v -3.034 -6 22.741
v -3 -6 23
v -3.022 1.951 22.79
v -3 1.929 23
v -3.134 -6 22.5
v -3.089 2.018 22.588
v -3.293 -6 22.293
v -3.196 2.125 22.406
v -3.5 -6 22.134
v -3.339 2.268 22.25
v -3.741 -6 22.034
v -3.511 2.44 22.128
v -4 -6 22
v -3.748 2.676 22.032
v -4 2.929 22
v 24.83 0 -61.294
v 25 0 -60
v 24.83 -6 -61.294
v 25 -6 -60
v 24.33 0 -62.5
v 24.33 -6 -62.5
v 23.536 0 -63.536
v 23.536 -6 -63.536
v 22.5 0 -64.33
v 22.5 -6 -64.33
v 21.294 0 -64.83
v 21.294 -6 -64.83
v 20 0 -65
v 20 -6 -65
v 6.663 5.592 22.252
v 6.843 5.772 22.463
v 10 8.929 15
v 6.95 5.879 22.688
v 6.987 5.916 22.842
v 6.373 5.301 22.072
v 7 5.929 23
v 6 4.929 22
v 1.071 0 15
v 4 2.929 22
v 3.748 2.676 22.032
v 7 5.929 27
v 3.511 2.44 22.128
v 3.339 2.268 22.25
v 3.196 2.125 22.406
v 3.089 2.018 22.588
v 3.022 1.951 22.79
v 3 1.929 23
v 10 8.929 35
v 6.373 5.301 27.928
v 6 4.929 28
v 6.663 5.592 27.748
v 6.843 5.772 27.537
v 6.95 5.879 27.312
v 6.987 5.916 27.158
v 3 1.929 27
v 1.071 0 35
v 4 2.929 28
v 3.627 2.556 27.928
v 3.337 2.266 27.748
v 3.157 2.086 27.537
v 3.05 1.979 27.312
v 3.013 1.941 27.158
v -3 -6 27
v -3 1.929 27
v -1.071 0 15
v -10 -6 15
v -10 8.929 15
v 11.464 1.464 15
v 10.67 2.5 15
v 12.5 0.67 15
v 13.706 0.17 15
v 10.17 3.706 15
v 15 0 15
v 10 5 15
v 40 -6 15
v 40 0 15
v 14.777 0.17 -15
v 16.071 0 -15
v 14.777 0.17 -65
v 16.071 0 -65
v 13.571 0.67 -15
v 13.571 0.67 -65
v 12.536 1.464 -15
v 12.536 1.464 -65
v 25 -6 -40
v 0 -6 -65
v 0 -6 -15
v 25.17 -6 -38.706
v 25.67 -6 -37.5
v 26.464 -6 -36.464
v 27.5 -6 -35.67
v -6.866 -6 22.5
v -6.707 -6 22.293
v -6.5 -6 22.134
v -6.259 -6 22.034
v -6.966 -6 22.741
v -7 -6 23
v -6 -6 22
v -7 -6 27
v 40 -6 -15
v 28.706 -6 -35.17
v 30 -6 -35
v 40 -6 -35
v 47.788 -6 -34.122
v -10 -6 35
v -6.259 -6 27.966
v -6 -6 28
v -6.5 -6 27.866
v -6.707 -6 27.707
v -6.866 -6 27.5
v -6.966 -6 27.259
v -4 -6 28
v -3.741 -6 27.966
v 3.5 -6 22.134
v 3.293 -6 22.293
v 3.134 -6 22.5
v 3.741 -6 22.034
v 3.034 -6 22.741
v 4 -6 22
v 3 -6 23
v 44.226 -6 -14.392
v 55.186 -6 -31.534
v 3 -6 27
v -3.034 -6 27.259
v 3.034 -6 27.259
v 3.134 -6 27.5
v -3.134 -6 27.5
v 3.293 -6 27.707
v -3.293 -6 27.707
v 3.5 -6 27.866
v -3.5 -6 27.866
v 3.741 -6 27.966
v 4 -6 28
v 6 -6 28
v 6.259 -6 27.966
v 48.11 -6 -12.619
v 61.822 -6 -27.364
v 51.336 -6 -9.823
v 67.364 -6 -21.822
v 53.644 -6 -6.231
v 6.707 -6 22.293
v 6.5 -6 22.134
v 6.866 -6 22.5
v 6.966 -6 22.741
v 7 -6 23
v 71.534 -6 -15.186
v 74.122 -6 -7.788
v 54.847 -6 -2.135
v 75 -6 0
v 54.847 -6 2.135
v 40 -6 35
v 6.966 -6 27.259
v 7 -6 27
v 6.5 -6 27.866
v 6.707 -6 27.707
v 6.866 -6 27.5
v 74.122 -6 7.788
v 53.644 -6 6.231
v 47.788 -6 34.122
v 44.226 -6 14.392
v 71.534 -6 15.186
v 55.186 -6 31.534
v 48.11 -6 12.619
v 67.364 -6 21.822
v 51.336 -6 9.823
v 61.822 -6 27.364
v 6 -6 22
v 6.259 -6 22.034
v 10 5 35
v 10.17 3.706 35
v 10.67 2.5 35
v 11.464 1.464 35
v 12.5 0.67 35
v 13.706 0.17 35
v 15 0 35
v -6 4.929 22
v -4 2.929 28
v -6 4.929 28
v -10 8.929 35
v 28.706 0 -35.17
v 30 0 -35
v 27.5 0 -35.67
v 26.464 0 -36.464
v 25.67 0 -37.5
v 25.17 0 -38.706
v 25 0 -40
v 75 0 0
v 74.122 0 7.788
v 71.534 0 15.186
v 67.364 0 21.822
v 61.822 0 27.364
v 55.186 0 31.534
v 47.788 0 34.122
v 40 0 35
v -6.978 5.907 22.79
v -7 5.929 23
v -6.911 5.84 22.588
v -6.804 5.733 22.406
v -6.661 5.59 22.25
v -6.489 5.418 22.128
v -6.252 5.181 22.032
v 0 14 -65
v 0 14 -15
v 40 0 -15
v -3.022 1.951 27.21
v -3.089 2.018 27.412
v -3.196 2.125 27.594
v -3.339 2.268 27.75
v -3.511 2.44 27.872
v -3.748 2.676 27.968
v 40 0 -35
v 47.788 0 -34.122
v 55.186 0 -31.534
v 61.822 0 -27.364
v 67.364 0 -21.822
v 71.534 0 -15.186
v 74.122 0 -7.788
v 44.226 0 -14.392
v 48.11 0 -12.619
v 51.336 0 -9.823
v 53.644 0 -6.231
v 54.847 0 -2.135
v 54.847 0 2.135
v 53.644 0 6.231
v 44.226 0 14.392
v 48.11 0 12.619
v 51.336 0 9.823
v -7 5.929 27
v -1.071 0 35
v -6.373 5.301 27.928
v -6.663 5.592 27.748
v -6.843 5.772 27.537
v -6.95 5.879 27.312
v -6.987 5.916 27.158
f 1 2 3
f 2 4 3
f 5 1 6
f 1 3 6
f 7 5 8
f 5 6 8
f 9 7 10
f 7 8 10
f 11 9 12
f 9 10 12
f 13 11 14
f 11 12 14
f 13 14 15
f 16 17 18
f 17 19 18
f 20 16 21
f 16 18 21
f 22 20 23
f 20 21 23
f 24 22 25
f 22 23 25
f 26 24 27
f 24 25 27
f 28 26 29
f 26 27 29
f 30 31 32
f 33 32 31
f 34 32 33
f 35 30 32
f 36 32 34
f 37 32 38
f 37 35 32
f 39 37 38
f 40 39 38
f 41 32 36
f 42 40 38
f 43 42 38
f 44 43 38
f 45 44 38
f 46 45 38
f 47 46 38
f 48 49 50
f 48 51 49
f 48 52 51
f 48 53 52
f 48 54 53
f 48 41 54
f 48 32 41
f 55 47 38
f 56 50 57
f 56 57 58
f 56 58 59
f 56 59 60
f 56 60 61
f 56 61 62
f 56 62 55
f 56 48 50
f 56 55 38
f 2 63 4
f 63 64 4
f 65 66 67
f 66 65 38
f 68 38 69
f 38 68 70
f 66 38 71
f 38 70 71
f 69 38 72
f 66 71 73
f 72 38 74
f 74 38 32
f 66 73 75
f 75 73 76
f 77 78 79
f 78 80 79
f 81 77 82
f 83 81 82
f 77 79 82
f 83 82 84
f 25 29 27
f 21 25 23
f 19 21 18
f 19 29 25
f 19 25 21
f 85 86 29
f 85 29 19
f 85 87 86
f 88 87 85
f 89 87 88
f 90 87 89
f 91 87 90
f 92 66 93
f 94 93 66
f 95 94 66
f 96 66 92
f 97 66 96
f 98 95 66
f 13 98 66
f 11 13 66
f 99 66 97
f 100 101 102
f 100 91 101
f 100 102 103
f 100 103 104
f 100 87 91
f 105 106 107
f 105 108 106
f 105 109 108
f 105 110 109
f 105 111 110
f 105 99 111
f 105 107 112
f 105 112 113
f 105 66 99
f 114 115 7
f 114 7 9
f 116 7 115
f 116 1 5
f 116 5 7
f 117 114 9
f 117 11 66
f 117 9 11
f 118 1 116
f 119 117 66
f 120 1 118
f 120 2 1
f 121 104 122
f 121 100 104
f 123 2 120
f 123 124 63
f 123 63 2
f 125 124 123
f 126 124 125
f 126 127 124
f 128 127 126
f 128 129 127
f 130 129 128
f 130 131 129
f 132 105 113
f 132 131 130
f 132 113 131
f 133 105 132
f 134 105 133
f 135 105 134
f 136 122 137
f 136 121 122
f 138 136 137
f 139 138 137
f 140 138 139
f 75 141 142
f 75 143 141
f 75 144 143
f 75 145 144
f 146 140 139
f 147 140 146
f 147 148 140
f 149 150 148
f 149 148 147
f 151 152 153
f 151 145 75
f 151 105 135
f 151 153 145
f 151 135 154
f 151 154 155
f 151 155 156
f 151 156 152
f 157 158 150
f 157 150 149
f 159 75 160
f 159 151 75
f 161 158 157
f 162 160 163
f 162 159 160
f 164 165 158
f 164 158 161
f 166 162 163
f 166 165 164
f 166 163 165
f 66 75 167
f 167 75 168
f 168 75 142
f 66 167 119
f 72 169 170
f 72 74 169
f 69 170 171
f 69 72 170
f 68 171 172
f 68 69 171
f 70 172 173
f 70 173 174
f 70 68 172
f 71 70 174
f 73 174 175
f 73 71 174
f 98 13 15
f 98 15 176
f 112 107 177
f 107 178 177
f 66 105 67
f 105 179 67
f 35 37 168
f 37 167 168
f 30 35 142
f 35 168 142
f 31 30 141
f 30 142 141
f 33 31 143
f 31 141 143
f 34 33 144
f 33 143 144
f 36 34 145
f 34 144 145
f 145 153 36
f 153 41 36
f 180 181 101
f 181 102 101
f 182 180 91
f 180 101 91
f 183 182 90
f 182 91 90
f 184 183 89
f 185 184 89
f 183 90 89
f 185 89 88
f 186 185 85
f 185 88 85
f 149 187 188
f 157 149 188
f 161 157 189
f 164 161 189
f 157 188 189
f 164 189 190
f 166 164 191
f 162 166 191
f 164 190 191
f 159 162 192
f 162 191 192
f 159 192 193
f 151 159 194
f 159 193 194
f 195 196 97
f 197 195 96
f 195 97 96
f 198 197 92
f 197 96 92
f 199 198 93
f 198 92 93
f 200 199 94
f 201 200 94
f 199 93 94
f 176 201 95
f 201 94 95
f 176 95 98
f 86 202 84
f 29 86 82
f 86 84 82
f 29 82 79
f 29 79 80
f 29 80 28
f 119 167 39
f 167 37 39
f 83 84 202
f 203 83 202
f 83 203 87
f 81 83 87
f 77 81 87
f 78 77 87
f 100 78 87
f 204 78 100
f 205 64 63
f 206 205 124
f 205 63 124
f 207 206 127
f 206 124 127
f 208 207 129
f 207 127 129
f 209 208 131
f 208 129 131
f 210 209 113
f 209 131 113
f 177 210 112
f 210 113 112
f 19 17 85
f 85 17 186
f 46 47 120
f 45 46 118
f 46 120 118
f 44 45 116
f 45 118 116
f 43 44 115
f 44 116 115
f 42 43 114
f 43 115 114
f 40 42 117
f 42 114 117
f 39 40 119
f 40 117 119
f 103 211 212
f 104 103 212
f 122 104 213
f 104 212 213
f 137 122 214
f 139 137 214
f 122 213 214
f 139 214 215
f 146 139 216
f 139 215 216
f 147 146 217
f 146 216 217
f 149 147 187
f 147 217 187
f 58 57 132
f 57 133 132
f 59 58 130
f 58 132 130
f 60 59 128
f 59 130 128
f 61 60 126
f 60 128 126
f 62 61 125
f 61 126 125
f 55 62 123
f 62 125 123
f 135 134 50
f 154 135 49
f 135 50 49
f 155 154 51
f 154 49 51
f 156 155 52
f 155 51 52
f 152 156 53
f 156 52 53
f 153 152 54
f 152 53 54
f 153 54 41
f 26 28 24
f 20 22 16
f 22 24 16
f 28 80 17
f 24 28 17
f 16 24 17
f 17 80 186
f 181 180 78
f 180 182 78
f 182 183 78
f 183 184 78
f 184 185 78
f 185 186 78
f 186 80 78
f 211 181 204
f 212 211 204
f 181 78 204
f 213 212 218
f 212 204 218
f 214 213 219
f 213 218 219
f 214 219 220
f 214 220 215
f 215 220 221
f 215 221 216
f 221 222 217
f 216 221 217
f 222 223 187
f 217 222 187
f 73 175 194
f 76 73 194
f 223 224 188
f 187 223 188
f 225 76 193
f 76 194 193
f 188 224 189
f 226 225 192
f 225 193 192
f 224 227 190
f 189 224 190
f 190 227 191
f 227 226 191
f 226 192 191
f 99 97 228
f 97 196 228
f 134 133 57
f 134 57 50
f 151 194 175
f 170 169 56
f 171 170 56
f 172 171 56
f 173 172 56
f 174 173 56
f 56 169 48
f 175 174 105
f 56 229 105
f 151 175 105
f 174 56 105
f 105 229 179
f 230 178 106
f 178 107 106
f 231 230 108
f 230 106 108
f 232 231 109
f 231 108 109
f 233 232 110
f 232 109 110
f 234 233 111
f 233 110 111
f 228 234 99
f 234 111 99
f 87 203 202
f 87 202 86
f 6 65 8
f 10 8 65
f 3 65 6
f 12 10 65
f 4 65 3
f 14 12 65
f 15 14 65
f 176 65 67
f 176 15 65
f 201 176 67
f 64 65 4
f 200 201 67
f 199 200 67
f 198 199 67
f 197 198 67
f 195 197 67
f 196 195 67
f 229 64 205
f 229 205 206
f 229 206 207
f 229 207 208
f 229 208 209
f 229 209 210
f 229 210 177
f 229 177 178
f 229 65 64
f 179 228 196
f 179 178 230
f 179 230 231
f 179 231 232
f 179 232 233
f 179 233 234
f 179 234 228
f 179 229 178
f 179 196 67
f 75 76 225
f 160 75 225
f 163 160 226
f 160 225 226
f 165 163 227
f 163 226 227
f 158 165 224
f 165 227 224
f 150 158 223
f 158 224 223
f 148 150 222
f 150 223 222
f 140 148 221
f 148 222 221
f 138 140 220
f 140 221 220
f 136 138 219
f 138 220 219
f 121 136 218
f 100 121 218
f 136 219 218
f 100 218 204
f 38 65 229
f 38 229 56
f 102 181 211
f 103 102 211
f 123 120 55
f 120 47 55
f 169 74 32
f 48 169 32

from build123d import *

# Parameters (mm, degrees)
F1_DEPTH = 6
F3_DEPTH = 50
F5_DEPTH = 20
F6_R     = 5
F7_DEPTH = 14.001
F8_R     = 1


with BuildPart() as f1:
    # F0 (on Front) → F1 (new body)
    with BuildSketch(Plane.XZ):
        with BuildLine():
            Line((-10, 15), (8.3772233983, 15))
            ThreePointArc((8.3772233983, 15), (21.2917130661, 29.5803989155), (40, 35))
            Line((40, 35), (-10, 35))
            Line((-10, 35), (-10, 15))
        make_face()
        Polygon((-7, 22), (-7, 25), (-7, 28), (-3, 28), (-3, 25), (-3, 22), align=None, mode=Mode.SUBTRACT)
        Polygon((7, 22), (3, 22), (3, 25), (3, 28), (7, 28), (7, 25), align=None, mode=Mode.SUBTRACT)
        with BuildLine():
            Line((40, -15), (25, -15))
            Line((25, -15), (25, -31.6227766017))
            ThreePointArc((25, -31.6227766017), (32.312255892, -34.1452572187), (40, -35))
            ThreePointArc((40, -35), (64.7487373415, -24.7487373415), (75, 0))
            ThreePointArc((75, 0), (64.7487373415, 24.7487373415), (40, 35))
            ThreePointArc((40, 35), (21.2917130661, 29.5803989155), (8.3772233983, 15))
            Line((8.3772233983, 15), (40, 15))
            ThreePointArc((40, 15), (50.6066017178, 10.6066017178), (55, 0))
            ThreePointArc((55, 0), (50.6066017178, -10.6066017178), (40, -15))
        make_face()
        with BuildLine():
            Line((25, -15), (8.3772233983, -15))
            ThreePointArc((8.3772233983, -15), (15.2512626585, -24.7487373415), (25, -31.6227766017))
            Line((25, -31.6227766017), (25, -15))
        make_face()
        with BuildLine():
            Line((8.3772233983, -15), (0, -15))
            Line((0, -15), (0, -65))
            Line((0, -65), (25, -65))
            Line((25, -65), (25, -35))
            Line((25, -35), (25, -31.6227766017))
            ThreePointArc((25, -31.6227766017), (15.2512626585, -24.7487373415), (8.3772233983, -15))
        make_face()
        with BuildLine():
            ThreePointArc((40, -35), (32.312255892, -34.1452572187), (25, -31.6227766017))
            Line((25, -31.6227766017), (25, -35))
            Line((25, -35), (40, -35))
        make_face()
    extrude(amount=F1_DEPTH)

    # F2 (on face) → F3 (join)
    with BuildSketch(Plane.XY.offset(-15)):
        Polygon((0, 0), (14, 0), (0, 14), align=None)
    extrude(amount=-F3_DEPTH)

    # F4 (on face) → F5 (join, through all)
    with BuildSketch(Plane.XY.offset(35)):
        Polygon((-10, 0), (-1.0710678119, 0), (-10, 8.9289321881), align=None)
        Polygon((1.0710678119, 0), (10, 0), (10, 8.9289321881), align=None)
    extrude(amount=-F5_DEPTH)

    # F6
    f6_edges = [f1.edges().sort_by_distance(p)[0] for p in [
        (25, -3, -35),
        (25, -3, -65),
        (10, 0, 25),
        (14, 0, -40),
    ]]
    fillet(f6_edges, radius=F6_R)

    # F0 (on Front) → F7 (cut, through all)
    with BuildSketch(Plane.XZ):
        Polygon((-7, 28), (-7, 25), (-7, 22), (-3, 22), (-3, 25), (-3, 28), align=None)
        Polygon((3, 25), (3, 22), (7, 22), (7, 25), (7, 28), (3, 28), align=None)
    extrude(amount=-F7_DEPTH, mode=Mode.SUBTRACT)

    # F8
    f8_edges = [f1.edges().sort_by_distance(p)[0] for p in [
        (7, -0.035534, 22),
        (-3, -2.035534, 22),
        (7, -0.035534, 28),
        (-3, -2.035534, 28),
        (-7, -0.035534, 28),
        (3, -2.035534, 28),
        (-7, -0.035534, 22),
        (3, -2.035534, 22),
    ]]
    fillet(f8_edges, radius=F8_R)


solid = f1.part
